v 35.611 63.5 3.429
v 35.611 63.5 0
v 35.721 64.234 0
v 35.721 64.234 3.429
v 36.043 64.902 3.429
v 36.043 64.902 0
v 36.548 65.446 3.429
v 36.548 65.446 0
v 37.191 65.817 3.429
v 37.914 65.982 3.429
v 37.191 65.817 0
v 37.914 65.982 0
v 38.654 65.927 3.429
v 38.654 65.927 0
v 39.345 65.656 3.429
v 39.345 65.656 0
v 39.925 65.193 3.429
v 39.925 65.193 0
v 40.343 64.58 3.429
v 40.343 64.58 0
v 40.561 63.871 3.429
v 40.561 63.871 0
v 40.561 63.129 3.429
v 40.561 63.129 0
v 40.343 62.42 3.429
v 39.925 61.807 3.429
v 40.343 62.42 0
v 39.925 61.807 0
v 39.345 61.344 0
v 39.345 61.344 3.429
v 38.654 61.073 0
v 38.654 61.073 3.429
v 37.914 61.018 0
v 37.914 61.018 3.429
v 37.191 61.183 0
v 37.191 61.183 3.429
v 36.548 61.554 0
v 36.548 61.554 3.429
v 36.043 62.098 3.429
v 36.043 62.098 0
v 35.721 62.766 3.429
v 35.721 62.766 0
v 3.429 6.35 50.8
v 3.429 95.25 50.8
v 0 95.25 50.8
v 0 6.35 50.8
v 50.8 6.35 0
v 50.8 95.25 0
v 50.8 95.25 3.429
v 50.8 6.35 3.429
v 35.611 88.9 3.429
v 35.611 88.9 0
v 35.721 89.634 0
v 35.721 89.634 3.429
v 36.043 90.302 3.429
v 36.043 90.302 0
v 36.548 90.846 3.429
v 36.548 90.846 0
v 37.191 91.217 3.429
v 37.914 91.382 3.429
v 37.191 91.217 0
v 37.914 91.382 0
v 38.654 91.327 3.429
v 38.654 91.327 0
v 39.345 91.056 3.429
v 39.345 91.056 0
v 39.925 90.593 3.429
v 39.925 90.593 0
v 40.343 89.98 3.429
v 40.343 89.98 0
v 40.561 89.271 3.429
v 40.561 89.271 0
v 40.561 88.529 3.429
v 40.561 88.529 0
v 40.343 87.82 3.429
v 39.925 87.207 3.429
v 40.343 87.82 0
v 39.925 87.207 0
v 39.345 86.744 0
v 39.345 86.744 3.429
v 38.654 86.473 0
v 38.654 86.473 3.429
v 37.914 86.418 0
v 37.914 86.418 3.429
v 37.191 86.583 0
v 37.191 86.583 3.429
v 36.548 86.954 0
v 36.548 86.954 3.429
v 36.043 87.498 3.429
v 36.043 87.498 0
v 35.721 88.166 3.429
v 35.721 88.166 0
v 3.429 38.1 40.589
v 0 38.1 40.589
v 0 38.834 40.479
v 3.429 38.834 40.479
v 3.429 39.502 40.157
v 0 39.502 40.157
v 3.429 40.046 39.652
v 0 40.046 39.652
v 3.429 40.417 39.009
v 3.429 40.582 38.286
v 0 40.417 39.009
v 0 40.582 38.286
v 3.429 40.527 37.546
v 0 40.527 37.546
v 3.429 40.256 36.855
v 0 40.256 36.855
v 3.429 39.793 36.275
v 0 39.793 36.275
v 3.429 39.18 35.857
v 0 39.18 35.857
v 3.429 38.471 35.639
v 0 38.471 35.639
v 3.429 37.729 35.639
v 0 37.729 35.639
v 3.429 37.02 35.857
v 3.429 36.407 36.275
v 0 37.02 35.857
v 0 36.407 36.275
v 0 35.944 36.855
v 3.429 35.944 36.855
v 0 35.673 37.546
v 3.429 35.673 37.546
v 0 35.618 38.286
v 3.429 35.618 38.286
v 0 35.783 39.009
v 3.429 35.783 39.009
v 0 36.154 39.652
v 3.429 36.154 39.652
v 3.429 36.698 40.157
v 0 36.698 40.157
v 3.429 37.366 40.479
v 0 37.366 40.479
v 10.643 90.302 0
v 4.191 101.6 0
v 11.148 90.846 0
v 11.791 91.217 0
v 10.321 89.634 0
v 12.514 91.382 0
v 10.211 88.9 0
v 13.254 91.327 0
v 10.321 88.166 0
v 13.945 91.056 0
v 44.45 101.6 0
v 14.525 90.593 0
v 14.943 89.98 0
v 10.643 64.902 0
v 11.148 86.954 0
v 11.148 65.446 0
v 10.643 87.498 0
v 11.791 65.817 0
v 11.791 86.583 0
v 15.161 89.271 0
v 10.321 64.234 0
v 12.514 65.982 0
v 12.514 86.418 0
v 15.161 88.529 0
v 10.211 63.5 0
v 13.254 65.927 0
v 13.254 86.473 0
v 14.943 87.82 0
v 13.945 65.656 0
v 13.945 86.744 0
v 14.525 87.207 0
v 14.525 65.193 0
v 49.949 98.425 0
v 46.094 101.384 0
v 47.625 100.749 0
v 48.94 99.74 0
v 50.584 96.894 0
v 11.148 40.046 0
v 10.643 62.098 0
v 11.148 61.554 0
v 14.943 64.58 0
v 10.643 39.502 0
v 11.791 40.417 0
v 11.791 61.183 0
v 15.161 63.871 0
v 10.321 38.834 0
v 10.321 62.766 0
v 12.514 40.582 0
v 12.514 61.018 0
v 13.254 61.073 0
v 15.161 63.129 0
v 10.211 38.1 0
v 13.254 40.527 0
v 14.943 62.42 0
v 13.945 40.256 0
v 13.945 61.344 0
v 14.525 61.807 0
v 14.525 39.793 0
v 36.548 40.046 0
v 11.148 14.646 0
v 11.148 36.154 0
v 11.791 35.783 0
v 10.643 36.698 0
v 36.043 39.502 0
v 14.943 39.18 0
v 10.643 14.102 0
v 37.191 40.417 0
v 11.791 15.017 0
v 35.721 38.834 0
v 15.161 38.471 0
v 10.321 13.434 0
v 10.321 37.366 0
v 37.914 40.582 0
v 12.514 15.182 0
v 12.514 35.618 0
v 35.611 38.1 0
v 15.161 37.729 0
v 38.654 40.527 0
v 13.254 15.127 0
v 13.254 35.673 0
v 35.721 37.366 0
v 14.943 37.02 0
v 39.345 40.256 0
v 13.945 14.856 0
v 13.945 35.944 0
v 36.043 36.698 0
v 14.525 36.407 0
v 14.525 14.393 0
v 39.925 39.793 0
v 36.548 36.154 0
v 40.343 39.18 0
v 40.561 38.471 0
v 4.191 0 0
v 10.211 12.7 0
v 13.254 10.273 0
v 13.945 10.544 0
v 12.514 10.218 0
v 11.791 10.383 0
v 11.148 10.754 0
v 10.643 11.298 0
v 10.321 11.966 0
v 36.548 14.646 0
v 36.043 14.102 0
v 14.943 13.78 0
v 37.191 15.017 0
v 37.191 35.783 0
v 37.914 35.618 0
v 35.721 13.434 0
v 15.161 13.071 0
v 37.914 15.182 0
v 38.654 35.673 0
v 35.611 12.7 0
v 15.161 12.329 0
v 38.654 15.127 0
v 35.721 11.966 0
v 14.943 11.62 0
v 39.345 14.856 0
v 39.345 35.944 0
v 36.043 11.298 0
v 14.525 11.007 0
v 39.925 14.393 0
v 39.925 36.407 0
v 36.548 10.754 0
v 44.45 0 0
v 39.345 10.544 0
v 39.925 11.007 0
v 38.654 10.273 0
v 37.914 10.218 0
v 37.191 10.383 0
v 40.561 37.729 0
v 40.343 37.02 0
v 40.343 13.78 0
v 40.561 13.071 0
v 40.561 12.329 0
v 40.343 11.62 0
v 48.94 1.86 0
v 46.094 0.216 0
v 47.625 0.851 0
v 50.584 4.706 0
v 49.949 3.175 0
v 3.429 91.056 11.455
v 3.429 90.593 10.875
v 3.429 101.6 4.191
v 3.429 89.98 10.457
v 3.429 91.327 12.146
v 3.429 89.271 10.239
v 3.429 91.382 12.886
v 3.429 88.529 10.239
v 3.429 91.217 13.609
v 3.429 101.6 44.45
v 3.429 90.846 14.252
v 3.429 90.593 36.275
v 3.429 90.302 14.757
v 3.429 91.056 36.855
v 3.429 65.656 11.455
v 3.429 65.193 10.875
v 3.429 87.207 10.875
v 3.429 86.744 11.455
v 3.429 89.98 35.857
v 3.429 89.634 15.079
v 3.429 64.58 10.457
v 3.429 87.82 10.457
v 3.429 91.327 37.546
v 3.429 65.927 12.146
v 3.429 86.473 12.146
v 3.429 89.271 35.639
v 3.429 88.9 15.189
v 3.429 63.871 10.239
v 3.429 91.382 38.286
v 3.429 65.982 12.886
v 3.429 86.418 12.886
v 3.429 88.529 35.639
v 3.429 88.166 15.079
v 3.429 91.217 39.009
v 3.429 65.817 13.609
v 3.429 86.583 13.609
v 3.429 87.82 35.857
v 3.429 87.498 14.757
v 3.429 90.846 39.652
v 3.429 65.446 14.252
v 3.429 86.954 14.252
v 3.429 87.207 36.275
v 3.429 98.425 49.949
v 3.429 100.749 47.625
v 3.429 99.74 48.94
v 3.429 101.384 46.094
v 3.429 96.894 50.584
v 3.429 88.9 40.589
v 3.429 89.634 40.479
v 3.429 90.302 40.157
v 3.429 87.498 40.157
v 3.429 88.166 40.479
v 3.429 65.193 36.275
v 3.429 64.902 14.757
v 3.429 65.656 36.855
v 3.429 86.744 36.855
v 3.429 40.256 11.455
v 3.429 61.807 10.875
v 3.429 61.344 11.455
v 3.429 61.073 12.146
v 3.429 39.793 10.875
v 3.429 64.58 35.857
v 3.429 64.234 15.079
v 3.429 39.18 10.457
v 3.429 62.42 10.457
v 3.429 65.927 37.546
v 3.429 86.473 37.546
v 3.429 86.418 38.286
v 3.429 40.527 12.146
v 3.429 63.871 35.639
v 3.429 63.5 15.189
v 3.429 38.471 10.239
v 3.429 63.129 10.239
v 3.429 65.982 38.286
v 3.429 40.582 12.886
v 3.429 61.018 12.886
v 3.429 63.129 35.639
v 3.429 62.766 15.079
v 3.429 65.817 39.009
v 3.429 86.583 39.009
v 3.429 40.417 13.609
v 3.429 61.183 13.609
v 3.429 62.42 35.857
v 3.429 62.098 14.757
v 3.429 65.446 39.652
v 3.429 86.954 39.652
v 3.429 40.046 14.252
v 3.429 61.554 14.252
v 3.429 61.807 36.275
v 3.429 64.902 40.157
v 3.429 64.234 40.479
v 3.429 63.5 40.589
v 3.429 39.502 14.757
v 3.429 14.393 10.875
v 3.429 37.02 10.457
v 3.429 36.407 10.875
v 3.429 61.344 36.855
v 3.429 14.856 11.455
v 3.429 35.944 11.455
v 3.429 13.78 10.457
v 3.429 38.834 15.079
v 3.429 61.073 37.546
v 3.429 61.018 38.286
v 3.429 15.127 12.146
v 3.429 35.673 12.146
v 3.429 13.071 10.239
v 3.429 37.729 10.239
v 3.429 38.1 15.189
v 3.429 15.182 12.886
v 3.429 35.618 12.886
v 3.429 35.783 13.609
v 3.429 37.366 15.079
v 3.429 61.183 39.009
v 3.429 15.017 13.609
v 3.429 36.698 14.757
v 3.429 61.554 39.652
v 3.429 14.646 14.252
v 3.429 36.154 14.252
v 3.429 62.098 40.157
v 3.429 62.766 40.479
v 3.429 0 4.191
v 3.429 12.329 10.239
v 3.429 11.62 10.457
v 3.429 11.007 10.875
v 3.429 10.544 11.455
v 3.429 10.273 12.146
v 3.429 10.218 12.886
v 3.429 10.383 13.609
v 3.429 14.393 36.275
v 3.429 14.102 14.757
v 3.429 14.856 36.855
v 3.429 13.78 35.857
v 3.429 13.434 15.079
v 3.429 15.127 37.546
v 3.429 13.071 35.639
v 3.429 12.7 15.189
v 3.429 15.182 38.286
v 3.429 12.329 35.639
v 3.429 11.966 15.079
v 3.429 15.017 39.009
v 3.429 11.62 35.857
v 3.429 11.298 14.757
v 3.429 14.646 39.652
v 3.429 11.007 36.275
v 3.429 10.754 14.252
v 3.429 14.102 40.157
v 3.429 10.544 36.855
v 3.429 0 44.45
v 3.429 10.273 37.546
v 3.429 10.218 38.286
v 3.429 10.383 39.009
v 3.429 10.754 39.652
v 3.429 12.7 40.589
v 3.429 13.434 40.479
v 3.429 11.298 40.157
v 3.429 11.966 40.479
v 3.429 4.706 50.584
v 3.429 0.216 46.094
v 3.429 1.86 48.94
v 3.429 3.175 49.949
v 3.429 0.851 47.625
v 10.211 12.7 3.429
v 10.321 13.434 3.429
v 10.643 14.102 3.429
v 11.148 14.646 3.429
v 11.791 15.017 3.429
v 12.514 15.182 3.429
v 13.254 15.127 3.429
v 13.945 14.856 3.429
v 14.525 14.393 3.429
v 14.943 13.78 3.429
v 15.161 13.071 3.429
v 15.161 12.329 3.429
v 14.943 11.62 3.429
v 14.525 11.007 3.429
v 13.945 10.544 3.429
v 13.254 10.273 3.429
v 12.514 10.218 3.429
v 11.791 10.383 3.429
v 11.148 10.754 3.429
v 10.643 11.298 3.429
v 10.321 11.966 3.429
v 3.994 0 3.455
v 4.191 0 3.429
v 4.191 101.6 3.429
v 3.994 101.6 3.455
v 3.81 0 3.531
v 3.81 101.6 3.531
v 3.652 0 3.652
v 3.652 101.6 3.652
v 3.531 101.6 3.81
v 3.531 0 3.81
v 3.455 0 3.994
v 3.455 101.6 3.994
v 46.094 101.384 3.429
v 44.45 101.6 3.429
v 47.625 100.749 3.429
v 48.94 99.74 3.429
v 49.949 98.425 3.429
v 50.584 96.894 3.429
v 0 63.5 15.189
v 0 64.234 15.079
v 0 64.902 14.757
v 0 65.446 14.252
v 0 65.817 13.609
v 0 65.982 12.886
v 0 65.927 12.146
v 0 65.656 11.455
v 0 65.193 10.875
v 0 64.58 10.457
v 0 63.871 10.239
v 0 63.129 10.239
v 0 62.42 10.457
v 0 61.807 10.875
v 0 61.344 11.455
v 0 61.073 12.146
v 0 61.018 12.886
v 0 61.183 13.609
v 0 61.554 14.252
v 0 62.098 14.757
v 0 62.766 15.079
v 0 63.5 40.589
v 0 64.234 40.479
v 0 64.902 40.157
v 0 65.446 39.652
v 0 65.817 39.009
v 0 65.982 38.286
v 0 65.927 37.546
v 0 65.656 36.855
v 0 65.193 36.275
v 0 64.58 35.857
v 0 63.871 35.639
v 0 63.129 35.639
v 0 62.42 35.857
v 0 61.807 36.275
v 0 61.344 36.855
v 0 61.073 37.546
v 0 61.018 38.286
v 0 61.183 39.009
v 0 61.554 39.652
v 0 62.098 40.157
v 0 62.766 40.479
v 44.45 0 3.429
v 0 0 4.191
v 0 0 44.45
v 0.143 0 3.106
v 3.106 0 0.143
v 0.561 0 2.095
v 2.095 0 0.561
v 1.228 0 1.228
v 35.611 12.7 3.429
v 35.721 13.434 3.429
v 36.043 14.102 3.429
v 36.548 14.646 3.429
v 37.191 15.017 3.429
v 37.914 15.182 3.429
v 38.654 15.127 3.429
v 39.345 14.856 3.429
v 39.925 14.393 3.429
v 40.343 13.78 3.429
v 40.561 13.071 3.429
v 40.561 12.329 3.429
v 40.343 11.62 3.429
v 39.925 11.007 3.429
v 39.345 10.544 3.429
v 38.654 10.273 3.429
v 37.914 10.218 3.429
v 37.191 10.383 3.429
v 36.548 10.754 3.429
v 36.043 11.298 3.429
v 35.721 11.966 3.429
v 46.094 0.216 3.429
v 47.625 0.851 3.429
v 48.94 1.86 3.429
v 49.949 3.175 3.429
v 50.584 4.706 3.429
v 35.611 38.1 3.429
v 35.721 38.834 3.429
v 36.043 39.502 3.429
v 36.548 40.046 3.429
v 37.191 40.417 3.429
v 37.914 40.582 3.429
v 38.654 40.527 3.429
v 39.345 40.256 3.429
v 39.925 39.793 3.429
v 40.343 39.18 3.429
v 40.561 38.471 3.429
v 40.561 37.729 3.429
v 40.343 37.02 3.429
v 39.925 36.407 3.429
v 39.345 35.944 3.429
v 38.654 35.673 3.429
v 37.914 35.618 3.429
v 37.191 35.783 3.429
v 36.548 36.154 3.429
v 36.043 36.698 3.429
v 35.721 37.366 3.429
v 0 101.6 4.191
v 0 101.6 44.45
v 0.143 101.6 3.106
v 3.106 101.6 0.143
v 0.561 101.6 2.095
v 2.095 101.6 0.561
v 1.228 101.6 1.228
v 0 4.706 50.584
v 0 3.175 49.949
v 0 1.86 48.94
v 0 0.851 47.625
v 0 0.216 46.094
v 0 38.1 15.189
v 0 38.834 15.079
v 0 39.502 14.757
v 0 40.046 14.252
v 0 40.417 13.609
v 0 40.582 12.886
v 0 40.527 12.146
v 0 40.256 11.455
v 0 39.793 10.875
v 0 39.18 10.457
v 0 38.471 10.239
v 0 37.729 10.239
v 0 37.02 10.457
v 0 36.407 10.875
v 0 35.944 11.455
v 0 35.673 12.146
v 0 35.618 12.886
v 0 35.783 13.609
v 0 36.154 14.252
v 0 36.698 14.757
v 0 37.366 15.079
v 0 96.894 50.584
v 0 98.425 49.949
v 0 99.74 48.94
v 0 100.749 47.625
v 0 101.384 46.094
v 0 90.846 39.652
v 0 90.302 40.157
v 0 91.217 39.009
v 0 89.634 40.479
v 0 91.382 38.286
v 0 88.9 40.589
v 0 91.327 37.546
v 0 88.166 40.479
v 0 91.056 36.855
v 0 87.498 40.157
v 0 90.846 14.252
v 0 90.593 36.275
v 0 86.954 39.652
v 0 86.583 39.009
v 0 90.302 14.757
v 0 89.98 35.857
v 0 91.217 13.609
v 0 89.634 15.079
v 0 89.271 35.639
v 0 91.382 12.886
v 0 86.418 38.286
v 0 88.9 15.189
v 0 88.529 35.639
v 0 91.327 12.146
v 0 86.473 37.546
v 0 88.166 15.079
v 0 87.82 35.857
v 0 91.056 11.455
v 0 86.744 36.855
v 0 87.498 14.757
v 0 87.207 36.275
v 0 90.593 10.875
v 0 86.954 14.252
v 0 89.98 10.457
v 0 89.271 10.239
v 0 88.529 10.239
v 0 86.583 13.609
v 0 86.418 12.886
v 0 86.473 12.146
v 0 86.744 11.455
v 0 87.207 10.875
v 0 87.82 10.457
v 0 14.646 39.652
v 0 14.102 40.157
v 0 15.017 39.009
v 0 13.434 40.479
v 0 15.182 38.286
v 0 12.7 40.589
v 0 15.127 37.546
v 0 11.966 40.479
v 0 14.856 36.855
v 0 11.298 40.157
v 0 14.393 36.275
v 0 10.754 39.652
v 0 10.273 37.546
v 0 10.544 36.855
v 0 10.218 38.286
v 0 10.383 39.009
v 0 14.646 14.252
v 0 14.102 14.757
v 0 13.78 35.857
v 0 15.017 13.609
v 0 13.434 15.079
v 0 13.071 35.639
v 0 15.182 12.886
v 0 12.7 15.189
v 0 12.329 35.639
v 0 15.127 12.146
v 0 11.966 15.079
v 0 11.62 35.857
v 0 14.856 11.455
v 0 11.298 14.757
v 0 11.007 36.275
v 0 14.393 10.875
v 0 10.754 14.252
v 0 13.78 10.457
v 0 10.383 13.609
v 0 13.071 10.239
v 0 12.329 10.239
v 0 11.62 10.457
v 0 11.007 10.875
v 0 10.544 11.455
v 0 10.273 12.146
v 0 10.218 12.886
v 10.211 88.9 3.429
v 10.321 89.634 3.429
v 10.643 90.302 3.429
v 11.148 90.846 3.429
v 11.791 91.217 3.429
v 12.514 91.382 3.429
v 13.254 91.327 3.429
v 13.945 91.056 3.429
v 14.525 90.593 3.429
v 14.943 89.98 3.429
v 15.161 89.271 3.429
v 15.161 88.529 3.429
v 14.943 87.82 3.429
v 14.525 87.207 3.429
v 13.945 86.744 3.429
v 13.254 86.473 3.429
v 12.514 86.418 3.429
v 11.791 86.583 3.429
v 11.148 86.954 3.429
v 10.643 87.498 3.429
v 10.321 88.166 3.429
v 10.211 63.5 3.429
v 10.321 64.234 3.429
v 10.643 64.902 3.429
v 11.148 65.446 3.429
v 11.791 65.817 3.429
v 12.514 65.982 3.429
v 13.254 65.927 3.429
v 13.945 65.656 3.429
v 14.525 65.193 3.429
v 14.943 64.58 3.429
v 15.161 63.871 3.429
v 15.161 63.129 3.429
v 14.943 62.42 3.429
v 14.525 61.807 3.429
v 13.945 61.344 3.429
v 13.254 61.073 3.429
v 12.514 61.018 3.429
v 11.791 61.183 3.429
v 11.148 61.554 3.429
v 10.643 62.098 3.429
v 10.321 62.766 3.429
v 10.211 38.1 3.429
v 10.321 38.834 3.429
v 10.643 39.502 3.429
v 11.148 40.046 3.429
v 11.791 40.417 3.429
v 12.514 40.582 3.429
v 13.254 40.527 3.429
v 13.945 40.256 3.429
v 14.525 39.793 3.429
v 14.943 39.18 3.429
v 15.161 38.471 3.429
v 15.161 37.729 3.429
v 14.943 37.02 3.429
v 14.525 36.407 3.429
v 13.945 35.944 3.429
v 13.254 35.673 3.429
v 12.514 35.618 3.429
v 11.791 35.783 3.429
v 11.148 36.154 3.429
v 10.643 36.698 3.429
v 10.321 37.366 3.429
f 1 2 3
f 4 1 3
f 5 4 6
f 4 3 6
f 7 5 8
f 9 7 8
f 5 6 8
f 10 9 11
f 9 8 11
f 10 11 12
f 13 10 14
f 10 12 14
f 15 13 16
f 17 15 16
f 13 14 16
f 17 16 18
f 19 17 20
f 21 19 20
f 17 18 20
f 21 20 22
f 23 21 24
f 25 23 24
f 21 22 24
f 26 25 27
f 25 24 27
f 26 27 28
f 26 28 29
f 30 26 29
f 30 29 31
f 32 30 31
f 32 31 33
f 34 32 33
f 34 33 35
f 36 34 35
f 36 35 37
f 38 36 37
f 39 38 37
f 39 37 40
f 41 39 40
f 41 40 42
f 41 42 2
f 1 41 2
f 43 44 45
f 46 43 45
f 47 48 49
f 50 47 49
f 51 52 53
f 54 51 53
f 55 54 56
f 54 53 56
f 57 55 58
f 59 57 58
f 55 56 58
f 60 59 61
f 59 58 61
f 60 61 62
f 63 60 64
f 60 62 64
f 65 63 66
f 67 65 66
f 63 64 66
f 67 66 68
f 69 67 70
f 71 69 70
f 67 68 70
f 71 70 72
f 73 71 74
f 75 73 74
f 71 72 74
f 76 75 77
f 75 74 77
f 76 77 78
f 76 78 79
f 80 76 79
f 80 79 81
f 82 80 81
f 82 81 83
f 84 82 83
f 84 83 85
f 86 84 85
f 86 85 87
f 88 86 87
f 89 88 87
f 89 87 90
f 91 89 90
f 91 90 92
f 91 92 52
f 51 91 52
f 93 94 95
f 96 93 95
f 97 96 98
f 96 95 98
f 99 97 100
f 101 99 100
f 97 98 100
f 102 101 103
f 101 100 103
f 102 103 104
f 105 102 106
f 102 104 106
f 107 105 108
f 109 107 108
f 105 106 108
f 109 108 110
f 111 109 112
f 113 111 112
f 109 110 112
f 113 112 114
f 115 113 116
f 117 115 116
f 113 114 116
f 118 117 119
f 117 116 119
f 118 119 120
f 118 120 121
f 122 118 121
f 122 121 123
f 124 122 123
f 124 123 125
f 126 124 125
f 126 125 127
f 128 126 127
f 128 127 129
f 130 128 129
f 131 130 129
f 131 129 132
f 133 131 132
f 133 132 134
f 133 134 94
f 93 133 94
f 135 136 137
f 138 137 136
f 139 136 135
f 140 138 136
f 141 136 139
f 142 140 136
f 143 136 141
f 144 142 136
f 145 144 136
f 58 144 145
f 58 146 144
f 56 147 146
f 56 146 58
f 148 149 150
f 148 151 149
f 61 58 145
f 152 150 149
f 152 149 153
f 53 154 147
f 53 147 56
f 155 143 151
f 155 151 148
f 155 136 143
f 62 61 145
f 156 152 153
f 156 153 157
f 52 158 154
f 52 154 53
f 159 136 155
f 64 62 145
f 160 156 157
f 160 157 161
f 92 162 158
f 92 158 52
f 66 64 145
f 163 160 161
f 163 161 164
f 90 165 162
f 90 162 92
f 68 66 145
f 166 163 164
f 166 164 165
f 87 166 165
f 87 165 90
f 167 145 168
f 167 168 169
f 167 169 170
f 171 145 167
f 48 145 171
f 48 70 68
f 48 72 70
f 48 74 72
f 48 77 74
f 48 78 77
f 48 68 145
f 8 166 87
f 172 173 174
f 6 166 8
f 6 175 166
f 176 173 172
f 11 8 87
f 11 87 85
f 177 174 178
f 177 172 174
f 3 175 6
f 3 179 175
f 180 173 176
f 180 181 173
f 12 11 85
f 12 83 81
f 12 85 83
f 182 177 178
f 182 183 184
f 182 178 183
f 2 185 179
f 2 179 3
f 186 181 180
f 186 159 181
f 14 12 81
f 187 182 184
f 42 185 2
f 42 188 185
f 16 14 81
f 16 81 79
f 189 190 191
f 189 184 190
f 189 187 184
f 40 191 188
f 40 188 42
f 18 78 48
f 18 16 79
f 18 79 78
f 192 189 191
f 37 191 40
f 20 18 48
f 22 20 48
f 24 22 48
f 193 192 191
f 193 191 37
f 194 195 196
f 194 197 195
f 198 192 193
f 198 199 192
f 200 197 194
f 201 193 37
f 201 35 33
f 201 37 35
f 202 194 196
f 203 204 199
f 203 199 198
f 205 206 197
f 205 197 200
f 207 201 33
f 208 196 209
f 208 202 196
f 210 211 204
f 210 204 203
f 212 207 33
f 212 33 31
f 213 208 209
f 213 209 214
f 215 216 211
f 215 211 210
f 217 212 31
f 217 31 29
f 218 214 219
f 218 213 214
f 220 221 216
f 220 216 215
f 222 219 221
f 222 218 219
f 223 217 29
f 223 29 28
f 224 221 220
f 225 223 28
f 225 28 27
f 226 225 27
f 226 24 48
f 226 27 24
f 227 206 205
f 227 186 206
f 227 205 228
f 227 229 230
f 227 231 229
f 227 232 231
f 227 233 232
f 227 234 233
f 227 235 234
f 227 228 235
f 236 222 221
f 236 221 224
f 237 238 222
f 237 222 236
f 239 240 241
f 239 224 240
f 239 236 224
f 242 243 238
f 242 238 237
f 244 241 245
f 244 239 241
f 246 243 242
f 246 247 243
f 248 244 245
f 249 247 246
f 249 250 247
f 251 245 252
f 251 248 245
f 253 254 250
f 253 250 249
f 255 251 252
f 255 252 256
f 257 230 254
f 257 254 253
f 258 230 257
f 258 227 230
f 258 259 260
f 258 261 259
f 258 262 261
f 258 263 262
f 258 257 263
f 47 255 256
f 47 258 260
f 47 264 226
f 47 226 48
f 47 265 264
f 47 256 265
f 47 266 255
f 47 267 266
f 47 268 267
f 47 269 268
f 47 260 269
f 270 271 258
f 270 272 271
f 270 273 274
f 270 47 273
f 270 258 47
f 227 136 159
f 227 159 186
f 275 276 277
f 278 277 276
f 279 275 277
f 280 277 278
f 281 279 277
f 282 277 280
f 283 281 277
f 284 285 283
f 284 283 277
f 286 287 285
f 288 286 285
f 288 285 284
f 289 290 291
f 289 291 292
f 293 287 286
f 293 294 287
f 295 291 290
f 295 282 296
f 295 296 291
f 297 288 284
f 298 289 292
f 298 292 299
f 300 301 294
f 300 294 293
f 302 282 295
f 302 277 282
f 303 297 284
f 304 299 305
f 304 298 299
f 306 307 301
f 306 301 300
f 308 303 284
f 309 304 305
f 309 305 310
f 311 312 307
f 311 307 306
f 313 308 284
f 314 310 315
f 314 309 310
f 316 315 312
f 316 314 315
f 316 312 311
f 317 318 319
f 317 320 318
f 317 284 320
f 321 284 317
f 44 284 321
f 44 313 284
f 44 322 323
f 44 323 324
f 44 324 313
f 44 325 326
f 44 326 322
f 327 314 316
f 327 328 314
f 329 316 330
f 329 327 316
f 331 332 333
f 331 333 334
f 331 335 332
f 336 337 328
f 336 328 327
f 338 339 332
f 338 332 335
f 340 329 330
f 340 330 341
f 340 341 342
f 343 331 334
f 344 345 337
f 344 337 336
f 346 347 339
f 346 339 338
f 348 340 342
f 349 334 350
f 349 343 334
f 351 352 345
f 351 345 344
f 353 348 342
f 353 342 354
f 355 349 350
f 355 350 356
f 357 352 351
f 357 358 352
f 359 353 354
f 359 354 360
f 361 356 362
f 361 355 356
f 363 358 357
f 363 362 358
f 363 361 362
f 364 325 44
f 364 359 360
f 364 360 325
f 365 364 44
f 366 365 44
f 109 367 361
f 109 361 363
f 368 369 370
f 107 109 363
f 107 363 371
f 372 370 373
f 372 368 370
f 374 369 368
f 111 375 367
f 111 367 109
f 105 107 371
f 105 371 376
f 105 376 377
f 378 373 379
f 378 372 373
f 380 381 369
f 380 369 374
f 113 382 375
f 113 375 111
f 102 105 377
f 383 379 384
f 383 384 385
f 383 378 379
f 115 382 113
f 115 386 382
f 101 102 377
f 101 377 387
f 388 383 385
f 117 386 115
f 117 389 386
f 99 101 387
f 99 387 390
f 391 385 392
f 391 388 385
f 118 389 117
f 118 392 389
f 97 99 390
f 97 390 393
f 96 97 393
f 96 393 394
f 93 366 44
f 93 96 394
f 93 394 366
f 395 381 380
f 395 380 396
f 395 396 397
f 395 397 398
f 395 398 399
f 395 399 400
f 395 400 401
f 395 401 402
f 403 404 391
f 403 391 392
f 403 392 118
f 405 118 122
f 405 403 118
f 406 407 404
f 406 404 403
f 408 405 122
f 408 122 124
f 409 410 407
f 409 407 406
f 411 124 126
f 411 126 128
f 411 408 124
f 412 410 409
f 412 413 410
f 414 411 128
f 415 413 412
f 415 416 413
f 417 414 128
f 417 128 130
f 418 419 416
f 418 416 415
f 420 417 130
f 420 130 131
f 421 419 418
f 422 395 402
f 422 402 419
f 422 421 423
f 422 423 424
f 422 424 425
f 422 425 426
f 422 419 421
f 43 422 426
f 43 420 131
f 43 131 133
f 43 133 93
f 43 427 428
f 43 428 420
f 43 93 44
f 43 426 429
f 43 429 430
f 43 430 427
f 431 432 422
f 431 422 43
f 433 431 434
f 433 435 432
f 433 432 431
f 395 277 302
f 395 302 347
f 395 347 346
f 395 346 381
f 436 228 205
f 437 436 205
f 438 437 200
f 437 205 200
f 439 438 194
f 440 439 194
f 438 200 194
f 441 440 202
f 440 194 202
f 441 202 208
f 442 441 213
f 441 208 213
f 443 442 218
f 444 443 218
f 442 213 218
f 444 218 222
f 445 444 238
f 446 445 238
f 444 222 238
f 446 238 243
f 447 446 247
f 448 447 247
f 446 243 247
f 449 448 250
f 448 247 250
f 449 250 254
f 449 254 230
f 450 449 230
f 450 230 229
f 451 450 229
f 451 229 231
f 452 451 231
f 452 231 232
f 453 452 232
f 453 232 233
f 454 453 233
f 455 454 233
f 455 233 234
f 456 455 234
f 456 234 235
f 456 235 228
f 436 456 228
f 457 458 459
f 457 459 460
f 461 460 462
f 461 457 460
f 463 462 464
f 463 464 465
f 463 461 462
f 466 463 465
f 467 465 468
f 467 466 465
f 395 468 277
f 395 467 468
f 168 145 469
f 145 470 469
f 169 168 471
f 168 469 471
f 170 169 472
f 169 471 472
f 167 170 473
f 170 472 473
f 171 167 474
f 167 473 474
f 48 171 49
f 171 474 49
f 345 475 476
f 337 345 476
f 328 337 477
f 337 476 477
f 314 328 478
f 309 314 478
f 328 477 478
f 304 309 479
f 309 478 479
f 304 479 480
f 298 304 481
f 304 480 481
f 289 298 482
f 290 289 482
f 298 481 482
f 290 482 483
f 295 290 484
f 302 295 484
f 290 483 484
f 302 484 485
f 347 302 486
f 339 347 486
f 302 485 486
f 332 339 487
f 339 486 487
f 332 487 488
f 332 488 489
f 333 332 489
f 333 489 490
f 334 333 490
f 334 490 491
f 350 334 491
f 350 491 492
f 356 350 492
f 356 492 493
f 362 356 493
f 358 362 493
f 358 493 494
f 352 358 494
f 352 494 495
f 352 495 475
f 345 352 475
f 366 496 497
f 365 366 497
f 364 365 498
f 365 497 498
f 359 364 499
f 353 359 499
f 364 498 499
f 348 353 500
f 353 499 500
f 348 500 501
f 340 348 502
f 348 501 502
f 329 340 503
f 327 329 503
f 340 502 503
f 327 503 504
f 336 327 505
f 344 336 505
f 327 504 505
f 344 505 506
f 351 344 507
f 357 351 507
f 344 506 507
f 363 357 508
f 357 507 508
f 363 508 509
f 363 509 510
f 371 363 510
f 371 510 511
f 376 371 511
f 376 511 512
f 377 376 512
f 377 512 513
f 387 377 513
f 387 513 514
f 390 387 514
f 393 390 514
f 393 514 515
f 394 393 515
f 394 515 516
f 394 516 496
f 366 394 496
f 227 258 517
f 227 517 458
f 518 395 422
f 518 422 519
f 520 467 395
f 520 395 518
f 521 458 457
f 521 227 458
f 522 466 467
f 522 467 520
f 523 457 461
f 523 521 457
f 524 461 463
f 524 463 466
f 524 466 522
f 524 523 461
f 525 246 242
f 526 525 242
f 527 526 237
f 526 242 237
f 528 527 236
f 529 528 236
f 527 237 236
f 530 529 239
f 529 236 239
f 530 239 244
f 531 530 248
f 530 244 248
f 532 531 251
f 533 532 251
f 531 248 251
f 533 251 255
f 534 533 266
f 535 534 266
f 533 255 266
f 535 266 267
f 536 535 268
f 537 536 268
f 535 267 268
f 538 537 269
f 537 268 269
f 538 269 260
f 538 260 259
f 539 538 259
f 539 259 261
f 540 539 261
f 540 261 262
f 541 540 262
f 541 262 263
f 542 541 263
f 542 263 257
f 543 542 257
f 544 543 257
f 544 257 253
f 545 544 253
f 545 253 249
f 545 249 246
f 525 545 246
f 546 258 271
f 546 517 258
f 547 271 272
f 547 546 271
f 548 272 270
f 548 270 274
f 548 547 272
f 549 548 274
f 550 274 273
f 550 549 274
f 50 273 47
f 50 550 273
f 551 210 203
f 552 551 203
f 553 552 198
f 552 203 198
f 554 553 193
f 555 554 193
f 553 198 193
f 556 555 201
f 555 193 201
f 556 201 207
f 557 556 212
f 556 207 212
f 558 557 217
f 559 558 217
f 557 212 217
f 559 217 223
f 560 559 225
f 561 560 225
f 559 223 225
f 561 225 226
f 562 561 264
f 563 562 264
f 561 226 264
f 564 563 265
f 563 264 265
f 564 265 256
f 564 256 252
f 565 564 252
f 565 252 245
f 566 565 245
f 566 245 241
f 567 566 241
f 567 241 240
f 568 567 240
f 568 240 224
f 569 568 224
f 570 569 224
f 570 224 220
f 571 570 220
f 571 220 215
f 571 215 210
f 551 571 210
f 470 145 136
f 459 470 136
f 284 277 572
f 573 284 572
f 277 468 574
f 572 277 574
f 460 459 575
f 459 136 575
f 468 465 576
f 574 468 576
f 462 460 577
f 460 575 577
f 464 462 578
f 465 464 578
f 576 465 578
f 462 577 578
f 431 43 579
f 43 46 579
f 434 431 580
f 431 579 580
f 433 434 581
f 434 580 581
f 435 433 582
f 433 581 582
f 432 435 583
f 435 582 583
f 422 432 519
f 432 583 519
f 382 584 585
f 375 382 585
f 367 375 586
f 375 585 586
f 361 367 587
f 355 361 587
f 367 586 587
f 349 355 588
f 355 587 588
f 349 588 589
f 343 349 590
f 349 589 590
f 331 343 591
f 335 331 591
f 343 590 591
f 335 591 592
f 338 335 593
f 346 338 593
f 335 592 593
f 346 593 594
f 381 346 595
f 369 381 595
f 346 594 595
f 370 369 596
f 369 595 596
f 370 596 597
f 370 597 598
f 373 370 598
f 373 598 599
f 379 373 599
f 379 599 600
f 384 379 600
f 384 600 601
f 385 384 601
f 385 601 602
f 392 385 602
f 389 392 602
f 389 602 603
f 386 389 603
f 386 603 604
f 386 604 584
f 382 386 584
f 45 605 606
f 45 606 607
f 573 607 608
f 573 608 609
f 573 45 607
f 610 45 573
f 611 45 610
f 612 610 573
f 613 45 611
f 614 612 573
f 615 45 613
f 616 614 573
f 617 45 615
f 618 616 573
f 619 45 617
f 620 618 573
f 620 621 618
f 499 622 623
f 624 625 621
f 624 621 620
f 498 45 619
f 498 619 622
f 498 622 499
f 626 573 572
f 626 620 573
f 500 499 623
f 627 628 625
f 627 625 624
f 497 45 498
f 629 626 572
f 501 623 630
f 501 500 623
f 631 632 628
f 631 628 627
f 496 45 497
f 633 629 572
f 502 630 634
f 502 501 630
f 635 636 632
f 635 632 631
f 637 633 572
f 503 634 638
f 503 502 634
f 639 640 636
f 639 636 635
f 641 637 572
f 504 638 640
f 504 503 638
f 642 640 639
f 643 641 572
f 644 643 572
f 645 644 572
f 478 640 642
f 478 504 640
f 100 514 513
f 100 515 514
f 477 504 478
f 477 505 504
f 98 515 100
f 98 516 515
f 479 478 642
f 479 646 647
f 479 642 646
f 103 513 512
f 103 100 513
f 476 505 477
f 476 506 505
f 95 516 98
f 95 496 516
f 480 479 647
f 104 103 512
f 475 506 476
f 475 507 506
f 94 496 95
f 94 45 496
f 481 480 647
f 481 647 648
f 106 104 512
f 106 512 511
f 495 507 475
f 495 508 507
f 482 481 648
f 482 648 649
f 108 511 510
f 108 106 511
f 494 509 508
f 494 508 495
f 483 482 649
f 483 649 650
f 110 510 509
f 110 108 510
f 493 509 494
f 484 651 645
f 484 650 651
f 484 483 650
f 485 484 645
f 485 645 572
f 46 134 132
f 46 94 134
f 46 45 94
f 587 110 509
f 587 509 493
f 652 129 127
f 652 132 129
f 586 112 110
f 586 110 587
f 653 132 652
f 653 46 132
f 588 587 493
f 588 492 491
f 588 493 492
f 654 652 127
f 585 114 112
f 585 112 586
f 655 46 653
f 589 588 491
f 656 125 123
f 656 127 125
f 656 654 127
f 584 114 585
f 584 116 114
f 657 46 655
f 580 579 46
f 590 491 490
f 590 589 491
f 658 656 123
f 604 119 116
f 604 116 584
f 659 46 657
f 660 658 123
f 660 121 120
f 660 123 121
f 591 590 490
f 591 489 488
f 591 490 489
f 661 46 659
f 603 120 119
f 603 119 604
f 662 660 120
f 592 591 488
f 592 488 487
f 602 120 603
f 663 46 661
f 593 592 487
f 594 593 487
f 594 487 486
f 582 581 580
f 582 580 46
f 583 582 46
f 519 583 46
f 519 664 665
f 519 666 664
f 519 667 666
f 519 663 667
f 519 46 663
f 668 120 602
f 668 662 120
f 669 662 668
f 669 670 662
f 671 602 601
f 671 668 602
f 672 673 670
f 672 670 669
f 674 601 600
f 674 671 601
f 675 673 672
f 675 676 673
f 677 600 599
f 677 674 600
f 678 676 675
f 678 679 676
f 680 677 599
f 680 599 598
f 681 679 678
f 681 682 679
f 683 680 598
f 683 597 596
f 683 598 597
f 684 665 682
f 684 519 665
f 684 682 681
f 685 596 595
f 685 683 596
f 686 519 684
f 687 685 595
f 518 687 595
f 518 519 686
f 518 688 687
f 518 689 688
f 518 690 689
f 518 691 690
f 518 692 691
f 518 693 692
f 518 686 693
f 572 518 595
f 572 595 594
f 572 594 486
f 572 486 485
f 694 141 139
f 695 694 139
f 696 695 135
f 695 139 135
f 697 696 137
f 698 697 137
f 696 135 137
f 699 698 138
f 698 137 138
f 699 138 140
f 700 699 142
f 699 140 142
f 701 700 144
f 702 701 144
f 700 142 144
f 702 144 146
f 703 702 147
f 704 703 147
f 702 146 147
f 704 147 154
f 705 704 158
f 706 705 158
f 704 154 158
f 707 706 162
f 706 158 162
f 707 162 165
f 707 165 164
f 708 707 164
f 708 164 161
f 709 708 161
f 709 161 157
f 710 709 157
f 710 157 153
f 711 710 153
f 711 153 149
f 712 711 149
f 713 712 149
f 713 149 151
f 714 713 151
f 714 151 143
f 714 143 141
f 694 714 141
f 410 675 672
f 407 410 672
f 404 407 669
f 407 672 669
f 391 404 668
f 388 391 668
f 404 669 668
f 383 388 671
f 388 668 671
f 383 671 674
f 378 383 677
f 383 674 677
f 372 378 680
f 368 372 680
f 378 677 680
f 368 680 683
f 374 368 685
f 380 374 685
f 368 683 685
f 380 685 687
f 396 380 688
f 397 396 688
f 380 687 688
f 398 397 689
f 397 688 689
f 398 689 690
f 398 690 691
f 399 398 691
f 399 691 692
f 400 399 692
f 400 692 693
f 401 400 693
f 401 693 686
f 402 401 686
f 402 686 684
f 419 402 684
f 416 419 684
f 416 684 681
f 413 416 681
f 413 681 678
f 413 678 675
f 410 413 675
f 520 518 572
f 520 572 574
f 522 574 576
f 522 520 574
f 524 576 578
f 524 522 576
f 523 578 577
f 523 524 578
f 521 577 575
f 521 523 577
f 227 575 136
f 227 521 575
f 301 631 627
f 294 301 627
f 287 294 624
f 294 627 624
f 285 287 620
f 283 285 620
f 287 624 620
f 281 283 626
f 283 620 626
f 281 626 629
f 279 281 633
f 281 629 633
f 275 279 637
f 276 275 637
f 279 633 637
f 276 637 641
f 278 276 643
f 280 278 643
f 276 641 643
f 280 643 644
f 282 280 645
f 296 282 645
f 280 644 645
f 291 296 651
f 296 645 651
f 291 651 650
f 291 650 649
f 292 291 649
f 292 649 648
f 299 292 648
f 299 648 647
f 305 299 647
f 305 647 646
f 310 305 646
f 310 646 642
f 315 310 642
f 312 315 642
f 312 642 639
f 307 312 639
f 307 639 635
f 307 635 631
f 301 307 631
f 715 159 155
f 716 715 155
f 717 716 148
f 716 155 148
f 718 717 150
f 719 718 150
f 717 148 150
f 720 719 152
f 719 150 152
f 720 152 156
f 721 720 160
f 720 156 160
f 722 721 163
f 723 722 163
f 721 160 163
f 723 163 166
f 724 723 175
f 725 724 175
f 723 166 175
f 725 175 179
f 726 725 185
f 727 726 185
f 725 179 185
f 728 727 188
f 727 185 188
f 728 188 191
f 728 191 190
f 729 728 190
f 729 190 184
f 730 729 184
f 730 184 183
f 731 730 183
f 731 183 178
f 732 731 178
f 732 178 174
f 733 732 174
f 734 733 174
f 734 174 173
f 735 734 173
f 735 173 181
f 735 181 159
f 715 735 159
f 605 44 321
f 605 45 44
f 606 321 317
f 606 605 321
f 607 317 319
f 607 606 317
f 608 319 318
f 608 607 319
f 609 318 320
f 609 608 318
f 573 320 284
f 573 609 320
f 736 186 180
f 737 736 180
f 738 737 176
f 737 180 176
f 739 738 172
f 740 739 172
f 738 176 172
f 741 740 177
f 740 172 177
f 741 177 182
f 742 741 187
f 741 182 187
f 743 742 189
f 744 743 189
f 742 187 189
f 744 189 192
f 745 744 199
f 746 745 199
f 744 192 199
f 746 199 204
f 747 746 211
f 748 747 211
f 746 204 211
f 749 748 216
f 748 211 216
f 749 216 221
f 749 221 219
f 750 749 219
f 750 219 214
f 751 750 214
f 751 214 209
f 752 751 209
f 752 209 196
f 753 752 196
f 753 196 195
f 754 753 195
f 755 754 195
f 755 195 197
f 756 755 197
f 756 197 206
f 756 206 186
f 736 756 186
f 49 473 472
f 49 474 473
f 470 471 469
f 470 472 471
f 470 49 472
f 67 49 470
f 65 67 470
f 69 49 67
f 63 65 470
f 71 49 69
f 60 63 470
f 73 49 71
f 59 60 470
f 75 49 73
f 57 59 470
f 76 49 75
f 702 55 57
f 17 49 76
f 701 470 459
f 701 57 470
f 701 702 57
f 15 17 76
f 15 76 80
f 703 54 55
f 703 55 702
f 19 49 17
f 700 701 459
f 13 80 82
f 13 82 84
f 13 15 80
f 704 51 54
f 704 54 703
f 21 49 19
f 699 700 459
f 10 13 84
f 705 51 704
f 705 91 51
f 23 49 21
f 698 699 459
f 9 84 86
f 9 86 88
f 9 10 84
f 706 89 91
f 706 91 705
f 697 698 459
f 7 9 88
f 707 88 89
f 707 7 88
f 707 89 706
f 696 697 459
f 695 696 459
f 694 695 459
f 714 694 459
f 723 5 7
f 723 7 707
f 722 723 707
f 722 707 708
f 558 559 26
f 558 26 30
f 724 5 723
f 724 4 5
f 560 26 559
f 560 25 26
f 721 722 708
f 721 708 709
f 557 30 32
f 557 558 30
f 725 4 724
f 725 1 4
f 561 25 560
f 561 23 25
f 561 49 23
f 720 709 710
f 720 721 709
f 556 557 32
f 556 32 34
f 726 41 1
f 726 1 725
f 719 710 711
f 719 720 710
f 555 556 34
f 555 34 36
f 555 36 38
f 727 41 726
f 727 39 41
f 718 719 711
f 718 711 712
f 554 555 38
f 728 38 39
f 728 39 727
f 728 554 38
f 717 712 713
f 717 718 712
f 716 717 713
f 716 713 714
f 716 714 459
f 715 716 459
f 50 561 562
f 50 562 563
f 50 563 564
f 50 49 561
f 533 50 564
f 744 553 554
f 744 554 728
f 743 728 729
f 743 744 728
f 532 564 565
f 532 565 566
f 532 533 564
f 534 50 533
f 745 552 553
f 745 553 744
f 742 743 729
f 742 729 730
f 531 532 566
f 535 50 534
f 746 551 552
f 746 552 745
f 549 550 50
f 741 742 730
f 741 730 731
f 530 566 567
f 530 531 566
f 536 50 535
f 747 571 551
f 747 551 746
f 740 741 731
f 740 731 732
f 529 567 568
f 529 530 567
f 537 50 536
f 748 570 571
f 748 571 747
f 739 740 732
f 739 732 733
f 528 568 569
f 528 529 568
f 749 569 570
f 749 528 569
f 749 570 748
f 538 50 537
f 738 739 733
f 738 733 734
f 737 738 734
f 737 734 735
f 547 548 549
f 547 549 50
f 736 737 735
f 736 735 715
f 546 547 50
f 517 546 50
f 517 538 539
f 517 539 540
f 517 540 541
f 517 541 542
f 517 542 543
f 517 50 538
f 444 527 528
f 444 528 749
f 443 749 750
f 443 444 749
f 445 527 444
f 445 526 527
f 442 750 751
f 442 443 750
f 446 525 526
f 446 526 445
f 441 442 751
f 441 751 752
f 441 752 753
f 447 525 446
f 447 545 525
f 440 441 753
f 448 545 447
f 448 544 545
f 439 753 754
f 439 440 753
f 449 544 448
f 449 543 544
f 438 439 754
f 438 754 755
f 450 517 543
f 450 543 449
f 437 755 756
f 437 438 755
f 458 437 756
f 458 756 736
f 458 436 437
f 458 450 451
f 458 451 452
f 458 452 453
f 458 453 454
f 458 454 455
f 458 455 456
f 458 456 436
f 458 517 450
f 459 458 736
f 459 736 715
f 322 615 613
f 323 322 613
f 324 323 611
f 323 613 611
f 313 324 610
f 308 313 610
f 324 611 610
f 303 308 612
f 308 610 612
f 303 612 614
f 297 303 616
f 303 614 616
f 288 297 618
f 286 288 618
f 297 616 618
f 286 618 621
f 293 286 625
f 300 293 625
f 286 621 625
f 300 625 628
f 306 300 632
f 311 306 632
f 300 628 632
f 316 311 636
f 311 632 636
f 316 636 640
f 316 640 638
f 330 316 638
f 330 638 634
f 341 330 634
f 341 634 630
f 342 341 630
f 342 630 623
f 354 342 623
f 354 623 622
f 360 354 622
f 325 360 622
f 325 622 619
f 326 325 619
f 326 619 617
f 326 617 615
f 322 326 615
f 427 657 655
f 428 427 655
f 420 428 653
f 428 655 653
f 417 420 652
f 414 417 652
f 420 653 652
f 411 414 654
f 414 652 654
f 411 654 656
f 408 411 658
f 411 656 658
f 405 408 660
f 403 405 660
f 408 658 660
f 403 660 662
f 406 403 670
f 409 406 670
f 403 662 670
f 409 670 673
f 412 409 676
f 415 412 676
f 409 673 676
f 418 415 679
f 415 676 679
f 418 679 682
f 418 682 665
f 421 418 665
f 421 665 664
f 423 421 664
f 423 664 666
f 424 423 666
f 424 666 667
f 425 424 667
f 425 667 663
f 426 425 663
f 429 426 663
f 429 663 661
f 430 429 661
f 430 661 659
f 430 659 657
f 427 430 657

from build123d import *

# Parameters (mm, degrees)
BASE_FLANGE1_DEPTH = 101.6
SKETCH7_R          = 2.4892
CUT_EXTRUDE1_DEPTH = 125.434078933
SKETCH8_R          = 2.4892
CUT_EXTRUDE2_DEPTH = 125.434078933
FILLET1_R          = 6.35


# Sheet-metal steps are written as plain solids
with BuildPart() as part:
    # Sketch2 → Base-Flange1 (new body)
    with BuildSketch(Plane(origin=(0, 0, 0), x_dir=(1, 0, 0), z_dir=(0, 1, 0))):
        with BuildLine():
            Line((0, -50.8), (0, -4.191))
            ThreePointArc((0, -4.191), (1.22751548, -1.22751548), (4.191, 0))
            Line((4.191, 0), (50.8, 0))
            Line((50.8, 0), (50.8, -3.429))
            Line((50.8, -3.429), (4.191, -3.429))
            ThreePointArc((4.191, -3.429), (3.652184633, -3.652184633), (3.429, -4.191))
            Line((3.429, -4.191), (3.429, -50.8))
            Line((3.429, -50.8), (0, -50.8))
        make_face()
    extrude(amount=BASE_FLANGE1_DEPTH)

    # Sketch7 → Cut-Extrude1 (cut, through all)
    with BuildSketch(Plane.ZY):
        with Locations((38.1, 88.9)):
            Circle(SKETCH7_R)
        with Locations((12.7, 88.9)):
            Circle(SKETCH7_R)
        with Locations((12.7, 63.5)):
            Circle(SKETCH7_R)
        with Locations((12.7, 38.1)):
            Circle(SKETCH7_R)
        with Locations((12.7, 12.7)):
            Circle(SKETCH7_R)
        with Locations((38.1, 63.5)):
            Circle(SKETCH7_R)
        with Locations((38.1, 38.1)):
            Circle(SKETCH7_R)
        with Locations((38.1, 12.7)):
            Circle(SKETCH7_R)
    extrude(amount=-CUT_EXTRUDE1_DEPTH, mode=Mode.SUBTRACT)

    # Sketch8 → Cut-Extrude2 (cut, through all)
    with BuildSketch(Plane(origin=(0, 0, 0), x_dir=(-1, 0, 0), z_dir=(0, 0, -1))):
        with Locations((-38.1, 88.9)):
            Circle(SKETCH8_R)
        with Locations((-12.7, 88.9)):
            Circle(SKETCH8_R)
        with Locations((-12.7, 63.5)):
            Circle(SKETCH8_R)
        with Locations((-12.7, 38.1)):
            Circle(SKETCH8_R)
        with Locations((-12.7, 12.7)):
            Circle(SKETCH8_R)
        with Locations((-38.1, 63.5)):
            Circle(SKETCH8_R)
        with Locations((-38.1, 38.1)):
            Circle(SKETCH8_R)
        with Locations((-38.1, 12.7)):
            Circle(SKETCH8_R)
    extrude(amount=-CUT_EXTRUDE2_DEPTH, mode=Mode.SUBTRACT)

    # Fillet1
    fillet1_edges = [part.edges().sort_by_distance(p)[0] for p in [
        (1.7145, 101.6, 50.8),
        (1.7145, 0, 50.8),
        (50.8, 101.6, 1.7145),
        (50.8, 0, 1.7145),
    ]]
    fillet(fillet1_edges, radius=FILLET1_R)


solid = part.part
